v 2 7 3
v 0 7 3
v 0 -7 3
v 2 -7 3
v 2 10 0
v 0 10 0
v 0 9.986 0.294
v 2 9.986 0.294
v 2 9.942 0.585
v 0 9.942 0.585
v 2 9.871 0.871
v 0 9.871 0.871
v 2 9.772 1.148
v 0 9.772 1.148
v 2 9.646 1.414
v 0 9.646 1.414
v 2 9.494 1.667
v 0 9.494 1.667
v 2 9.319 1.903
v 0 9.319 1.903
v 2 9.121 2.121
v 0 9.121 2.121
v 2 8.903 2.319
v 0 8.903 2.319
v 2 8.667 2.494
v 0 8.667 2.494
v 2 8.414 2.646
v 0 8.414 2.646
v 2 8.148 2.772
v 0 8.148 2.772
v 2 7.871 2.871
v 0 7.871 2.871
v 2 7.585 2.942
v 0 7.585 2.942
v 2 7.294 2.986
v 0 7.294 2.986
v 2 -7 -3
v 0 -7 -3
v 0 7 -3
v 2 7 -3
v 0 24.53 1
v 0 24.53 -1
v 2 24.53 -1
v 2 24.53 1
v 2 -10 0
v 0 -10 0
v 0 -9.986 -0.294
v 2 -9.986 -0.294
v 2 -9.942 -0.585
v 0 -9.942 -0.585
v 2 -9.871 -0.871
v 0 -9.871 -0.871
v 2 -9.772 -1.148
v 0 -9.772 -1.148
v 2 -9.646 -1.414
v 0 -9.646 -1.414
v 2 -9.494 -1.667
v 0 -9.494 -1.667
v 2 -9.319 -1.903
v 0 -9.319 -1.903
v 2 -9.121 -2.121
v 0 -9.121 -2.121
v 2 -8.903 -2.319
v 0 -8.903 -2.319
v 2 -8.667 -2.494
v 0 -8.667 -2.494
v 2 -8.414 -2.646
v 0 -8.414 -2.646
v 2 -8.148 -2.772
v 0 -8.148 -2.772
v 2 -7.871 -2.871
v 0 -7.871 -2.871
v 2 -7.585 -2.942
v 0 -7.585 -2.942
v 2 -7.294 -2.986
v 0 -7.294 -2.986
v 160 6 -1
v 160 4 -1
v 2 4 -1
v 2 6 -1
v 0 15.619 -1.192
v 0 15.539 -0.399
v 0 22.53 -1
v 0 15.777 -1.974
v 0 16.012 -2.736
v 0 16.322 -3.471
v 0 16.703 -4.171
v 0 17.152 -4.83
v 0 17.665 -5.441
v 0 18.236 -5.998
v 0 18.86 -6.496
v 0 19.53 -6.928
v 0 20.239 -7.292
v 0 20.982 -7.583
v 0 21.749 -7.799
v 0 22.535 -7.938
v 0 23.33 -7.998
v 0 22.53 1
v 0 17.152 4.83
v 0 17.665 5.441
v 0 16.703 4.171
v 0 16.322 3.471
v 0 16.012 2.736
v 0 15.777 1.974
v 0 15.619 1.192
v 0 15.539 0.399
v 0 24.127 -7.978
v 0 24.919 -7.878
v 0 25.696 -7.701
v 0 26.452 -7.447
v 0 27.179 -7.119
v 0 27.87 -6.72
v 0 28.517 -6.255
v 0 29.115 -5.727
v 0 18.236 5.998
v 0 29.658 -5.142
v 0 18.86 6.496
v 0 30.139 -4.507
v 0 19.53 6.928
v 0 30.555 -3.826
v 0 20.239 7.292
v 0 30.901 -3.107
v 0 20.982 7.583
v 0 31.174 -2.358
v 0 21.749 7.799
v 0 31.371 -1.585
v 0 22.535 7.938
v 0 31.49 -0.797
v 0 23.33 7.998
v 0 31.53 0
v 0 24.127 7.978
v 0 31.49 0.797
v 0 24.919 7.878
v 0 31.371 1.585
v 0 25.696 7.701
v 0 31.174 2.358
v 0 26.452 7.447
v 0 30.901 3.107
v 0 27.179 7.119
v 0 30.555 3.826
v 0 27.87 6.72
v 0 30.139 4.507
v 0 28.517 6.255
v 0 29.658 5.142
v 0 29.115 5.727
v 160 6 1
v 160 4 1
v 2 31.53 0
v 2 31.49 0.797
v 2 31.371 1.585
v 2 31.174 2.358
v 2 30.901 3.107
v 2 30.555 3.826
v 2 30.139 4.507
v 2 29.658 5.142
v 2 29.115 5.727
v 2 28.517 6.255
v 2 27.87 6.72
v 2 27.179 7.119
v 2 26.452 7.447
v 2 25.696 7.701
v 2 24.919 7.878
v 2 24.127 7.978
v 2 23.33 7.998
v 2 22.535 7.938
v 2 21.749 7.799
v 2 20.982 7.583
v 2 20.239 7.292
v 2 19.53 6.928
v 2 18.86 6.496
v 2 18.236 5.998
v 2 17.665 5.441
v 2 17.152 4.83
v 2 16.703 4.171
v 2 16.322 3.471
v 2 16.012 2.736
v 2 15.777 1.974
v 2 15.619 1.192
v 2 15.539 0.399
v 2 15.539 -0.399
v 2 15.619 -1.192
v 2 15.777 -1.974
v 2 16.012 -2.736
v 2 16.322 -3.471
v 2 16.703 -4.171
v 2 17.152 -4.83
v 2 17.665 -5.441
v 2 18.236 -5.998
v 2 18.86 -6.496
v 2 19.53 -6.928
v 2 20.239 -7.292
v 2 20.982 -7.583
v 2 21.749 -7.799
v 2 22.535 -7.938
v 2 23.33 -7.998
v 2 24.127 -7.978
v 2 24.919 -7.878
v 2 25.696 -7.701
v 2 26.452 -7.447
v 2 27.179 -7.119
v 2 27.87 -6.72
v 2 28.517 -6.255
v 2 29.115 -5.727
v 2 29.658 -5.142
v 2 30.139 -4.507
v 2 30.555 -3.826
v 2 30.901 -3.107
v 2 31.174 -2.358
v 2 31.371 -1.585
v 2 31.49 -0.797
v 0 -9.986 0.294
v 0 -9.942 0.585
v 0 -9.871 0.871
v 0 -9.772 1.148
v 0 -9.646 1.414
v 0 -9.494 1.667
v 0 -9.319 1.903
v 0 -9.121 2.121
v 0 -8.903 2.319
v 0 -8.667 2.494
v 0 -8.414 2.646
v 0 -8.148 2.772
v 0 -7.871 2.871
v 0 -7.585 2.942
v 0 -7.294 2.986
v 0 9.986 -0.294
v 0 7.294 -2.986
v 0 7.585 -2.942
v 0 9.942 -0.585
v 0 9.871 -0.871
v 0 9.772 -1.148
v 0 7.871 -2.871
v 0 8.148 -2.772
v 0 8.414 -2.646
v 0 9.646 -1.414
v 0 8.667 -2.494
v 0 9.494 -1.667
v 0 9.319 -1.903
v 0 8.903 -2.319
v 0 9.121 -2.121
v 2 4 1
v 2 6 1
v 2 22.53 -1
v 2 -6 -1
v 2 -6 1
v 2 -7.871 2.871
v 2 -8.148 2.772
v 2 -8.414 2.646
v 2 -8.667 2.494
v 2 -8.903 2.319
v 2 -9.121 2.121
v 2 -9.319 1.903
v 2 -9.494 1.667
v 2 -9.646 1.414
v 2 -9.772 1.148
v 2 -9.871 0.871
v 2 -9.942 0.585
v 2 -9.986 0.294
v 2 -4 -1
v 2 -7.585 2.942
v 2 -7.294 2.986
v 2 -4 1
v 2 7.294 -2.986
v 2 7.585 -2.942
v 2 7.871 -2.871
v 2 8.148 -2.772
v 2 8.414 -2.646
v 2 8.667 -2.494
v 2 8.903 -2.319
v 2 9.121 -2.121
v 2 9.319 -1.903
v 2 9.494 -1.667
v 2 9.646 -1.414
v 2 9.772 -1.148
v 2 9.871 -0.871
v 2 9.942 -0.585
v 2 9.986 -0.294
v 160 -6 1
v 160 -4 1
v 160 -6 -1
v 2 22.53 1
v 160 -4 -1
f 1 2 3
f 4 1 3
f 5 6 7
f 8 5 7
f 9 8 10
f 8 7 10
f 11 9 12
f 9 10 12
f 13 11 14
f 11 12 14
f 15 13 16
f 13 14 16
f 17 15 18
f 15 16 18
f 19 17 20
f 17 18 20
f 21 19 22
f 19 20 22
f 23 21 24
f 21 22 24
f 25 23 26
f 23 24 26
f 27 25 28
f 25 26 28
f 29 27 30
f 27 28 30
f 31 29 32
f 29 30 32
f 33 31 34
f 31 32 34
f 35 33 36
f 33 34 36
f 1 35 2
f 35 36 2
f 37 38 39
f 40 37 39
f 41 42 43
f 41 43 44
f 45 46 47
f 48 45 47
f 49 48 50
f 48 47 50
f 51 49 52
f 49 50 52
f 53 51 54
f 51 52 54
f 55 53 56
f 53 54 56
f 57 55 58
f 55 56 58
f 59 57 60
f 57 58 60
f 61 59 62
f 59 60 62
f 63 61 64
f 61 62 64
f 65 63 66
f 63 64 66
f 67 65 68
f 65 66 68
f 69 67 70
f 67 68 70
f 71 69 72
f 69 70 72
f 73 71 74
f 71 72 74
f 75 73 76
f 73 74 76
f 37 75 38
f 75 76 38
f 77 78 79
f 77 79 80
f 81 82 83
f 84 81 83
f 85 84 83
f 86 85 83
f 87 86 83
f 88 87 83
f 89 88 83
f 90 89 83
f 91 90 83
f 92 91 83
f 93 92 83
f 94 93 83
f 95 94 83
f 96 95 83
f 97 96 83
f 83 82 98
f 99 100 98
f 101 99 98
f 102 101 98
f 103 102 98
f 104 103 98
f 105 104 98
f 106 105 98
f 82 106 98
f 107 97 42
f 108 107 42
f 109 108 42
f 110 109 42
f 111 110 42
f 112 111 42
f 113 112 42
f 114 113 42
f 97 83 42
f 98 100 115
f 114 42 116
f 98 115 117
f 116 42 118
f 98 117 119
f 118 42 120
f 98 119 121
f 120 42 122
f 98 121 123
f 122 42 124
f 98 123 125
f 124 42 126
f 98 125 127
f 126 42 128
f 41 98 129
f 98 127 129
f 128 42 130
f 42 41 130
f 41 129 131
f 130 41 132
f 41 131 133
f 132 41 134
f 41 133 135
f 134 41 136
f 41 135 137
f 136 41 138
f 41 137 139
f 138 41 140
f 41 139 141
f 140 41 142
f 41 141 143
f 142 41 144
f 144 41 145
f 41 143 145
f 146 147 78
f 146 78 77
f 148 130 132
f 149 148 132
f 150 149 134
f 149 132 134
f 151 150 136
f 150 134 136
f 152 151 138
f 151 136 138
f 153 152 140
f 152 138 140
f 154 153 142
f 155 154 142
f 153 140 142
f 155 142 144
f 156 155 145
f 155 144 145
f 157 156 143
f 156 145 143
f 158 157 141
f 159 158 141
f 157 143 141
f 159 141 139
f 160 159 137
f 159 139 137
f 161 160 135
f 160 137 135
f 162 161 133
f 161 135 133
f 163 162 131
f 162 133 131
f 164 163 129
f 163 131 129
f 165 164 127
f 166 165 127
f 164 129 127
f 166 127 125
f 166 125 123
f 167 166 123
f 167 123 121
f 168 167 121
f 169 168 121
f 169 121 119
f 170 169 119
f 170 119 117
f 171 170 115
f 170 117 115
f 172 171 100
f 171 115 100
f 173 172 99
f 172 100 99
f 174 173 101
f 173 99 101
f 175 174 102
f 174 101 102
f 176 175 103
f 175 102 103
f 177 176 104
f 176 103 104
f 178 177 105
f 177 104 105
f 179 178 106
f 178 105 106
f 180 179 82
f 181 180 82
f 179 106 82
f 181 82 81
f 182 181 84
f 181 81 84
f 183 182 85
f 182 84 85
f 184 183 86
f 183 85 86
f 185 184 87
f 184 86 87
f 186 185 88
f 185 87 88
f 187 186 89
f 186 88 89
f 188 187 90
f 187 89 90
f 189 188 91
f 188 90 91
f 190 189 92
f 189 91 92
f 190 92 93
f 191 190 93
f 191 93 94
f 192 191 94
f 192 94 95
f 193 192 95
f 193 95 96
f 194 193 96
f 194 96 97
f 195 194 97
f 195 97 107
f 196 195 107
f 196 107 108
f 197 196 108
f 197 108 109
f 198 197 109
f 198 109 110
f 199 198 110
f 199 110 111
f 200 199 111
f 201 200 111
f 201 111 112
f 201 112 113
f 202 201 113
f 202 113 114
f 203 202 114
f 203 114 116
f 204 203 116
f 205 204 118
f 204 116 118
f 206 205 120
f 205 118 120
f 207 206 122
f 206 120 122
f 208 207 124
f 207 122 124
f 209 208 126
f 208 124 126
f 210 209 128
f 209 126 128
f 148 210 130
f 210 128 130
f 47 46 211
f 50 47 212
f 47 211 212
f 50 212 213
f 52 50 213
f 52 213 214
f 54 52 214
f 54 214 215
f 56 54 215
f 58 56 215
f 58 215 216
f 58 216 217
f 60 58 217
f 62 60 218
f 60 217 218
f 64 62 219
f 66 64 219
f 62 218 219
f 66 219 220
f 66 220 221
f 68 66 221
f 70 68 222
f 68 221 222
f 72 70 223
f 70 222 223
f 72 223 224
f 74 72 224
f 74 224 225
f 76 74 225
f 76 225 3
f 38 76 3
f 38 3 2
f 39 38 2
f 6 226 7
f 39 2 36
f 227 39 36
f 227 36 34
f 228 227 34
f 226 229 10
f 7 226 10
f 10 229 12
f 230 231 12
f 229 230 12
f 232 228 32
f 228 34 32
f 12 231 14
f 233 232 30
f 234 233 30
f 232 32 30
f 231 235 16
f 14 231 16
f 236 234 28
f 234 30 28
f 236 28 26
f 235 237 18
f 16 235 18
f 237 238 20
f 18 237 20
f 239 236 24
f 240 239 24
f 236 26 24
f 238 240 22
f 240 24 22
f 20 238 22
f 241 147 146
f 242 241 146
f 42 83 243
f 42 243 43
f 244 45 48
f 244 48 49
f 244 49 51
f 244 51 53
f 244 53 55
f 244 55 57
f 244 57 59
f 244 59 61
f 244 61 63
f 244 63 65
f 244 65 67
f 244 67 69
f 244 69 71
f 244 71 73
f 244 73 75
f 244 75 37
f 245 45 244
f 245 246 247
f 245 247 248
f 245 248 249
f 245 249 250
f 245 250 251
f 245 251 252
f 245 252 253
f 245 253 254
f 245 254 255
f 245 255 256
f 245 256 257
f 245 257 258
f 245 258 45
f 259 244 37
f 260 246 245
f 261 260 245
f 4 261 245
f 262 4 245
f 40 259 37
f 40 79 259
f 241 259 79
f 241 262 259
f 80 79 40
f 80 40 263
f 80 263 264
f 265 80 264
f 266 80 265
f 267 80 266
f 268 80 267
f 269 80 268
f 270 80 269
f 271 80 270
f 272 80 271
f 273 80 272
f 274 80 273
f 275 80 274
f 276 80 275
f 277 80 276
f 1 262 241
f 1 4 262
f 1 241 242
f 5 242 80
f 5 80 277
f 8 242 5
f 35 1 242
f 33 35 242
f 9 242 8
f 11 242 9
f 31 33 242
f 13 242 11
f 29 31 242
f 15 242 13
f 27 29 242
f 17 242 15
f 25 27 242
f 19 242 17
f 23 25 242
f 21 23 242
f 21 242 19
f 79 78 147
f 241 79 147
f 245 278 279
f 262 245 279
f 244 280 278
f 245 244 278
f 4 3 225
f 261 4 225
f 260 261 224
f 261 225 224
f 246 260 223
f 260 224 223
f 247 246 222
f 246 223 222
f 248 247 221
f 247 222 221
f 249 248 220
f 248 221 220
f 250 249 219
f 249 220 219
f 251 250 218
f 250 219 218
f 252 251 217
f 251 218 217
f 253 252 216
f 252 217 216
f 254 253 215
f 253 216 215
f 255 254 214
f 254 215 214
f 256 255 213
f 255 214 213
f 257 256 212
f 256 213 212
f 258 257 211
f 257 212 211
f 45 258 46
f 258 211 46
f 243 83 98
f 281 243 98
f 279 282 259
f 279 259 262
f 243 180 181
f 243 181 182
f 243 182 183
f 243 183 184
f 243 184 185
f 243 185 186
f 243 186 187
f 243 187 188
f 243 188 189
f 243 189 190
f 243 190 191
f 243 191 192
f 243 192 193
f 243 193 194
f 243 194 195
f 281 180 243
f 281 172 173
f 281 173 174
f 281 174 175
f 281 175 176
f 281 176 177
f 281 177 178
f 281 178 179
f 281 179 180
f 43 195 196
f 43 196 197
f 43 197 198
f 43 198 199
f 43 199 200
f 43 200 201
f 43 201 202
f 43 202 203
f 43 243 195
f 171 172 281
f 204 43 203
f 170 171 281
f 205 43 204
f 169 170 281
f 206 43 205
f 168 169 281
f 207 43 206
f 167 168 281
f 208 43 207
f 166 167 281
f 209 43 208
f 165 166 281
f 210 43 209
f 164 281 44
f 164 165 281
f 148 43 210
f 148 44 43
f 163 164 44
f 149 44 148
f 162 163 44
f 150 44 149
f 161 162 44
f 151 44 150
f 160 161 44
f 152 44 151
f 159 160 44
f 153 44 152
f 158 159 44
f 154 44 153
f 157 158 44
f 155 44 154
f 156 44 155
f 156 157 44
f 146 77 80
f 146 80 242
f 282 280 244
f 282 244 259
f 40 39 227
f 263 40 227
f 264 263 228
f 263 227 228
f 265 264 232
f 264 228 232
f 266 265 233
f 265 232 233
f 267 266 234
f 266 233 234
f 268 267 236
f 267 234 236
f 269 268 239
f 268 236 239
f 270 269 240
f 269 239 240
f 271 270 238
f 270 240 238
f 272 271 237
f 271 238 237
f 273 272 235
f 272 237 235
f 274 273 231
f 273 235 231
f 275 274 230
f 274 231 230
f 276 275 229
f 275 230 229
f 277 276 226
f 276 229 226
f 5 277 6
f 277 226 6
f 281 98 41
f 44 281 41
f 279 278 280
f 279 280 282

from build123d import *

# Parameters (mm, degrees)
F0_W     = 2
F0_H     = 2
F1_DEPTH = 2
F2_DEPTH = 160
F0_R     = 8
F3_DEPTH = 2


with BuildPart() as f1:
    # F0 (on Right) → F1 (new body)
    with BuildSketch(Plane.YZ):
        with BuildLine():
            ThreePointArc((10, 0), (9.12132, 2.12132), (7, 3))
            Line((7, 3), (-7, 3))
            ThreePointArc((-7, 3), (-9.12132, 2.12132), (-10, 0))
            ThreePointArc((-10, 0), (-9.12132, -2.12132), (-7, -3))
            Line((-7, -3), (7, -3))
            ThreePointArc((7, -3), (9.12132, -2.12132), (10, 0))
        make_face()
        with Locations((-5, 0)):
            Rectangle(F0_W, F0_H, mode=Mode.SUBTRACT)
        with Locations((5, 0)):
            Rectangle(F0_W, F0_H, mode=Mode.SUBTRACT)
        with Locations((-5, 0)):
            Rectangle(F0_W, F0_H)
        with Locations((5, 0)):
            Rectangle(F0_W, F0_H)
    extrude(amount=F1_DEPTH)

    # F0 (on Right) → F2 (join)
    with BuildSketch(Plane.YZ):
        with Locations((-5, 0)):
            Rectangle(F0_W, F0_H)
        with Locations((5, 0)):
            Rectangle(F0_W, F0_H)
    extrude(amount=F2_DEPTH)


with BuildPart() as f3:
    # F0 (on Right) → F3 (new body)
    with BuildSketch(Plane.YZ):
        with Locations((23.529518, 0)):
            Circle(F0_R)
        with Locations((23.529518, 0)):
            Rectangle(F0_W, F0_H, mode=Mode.SUBTRACT)
    extrude(amount=F3_DEPTH)


solid = Compound([f1.part, f3.part])
